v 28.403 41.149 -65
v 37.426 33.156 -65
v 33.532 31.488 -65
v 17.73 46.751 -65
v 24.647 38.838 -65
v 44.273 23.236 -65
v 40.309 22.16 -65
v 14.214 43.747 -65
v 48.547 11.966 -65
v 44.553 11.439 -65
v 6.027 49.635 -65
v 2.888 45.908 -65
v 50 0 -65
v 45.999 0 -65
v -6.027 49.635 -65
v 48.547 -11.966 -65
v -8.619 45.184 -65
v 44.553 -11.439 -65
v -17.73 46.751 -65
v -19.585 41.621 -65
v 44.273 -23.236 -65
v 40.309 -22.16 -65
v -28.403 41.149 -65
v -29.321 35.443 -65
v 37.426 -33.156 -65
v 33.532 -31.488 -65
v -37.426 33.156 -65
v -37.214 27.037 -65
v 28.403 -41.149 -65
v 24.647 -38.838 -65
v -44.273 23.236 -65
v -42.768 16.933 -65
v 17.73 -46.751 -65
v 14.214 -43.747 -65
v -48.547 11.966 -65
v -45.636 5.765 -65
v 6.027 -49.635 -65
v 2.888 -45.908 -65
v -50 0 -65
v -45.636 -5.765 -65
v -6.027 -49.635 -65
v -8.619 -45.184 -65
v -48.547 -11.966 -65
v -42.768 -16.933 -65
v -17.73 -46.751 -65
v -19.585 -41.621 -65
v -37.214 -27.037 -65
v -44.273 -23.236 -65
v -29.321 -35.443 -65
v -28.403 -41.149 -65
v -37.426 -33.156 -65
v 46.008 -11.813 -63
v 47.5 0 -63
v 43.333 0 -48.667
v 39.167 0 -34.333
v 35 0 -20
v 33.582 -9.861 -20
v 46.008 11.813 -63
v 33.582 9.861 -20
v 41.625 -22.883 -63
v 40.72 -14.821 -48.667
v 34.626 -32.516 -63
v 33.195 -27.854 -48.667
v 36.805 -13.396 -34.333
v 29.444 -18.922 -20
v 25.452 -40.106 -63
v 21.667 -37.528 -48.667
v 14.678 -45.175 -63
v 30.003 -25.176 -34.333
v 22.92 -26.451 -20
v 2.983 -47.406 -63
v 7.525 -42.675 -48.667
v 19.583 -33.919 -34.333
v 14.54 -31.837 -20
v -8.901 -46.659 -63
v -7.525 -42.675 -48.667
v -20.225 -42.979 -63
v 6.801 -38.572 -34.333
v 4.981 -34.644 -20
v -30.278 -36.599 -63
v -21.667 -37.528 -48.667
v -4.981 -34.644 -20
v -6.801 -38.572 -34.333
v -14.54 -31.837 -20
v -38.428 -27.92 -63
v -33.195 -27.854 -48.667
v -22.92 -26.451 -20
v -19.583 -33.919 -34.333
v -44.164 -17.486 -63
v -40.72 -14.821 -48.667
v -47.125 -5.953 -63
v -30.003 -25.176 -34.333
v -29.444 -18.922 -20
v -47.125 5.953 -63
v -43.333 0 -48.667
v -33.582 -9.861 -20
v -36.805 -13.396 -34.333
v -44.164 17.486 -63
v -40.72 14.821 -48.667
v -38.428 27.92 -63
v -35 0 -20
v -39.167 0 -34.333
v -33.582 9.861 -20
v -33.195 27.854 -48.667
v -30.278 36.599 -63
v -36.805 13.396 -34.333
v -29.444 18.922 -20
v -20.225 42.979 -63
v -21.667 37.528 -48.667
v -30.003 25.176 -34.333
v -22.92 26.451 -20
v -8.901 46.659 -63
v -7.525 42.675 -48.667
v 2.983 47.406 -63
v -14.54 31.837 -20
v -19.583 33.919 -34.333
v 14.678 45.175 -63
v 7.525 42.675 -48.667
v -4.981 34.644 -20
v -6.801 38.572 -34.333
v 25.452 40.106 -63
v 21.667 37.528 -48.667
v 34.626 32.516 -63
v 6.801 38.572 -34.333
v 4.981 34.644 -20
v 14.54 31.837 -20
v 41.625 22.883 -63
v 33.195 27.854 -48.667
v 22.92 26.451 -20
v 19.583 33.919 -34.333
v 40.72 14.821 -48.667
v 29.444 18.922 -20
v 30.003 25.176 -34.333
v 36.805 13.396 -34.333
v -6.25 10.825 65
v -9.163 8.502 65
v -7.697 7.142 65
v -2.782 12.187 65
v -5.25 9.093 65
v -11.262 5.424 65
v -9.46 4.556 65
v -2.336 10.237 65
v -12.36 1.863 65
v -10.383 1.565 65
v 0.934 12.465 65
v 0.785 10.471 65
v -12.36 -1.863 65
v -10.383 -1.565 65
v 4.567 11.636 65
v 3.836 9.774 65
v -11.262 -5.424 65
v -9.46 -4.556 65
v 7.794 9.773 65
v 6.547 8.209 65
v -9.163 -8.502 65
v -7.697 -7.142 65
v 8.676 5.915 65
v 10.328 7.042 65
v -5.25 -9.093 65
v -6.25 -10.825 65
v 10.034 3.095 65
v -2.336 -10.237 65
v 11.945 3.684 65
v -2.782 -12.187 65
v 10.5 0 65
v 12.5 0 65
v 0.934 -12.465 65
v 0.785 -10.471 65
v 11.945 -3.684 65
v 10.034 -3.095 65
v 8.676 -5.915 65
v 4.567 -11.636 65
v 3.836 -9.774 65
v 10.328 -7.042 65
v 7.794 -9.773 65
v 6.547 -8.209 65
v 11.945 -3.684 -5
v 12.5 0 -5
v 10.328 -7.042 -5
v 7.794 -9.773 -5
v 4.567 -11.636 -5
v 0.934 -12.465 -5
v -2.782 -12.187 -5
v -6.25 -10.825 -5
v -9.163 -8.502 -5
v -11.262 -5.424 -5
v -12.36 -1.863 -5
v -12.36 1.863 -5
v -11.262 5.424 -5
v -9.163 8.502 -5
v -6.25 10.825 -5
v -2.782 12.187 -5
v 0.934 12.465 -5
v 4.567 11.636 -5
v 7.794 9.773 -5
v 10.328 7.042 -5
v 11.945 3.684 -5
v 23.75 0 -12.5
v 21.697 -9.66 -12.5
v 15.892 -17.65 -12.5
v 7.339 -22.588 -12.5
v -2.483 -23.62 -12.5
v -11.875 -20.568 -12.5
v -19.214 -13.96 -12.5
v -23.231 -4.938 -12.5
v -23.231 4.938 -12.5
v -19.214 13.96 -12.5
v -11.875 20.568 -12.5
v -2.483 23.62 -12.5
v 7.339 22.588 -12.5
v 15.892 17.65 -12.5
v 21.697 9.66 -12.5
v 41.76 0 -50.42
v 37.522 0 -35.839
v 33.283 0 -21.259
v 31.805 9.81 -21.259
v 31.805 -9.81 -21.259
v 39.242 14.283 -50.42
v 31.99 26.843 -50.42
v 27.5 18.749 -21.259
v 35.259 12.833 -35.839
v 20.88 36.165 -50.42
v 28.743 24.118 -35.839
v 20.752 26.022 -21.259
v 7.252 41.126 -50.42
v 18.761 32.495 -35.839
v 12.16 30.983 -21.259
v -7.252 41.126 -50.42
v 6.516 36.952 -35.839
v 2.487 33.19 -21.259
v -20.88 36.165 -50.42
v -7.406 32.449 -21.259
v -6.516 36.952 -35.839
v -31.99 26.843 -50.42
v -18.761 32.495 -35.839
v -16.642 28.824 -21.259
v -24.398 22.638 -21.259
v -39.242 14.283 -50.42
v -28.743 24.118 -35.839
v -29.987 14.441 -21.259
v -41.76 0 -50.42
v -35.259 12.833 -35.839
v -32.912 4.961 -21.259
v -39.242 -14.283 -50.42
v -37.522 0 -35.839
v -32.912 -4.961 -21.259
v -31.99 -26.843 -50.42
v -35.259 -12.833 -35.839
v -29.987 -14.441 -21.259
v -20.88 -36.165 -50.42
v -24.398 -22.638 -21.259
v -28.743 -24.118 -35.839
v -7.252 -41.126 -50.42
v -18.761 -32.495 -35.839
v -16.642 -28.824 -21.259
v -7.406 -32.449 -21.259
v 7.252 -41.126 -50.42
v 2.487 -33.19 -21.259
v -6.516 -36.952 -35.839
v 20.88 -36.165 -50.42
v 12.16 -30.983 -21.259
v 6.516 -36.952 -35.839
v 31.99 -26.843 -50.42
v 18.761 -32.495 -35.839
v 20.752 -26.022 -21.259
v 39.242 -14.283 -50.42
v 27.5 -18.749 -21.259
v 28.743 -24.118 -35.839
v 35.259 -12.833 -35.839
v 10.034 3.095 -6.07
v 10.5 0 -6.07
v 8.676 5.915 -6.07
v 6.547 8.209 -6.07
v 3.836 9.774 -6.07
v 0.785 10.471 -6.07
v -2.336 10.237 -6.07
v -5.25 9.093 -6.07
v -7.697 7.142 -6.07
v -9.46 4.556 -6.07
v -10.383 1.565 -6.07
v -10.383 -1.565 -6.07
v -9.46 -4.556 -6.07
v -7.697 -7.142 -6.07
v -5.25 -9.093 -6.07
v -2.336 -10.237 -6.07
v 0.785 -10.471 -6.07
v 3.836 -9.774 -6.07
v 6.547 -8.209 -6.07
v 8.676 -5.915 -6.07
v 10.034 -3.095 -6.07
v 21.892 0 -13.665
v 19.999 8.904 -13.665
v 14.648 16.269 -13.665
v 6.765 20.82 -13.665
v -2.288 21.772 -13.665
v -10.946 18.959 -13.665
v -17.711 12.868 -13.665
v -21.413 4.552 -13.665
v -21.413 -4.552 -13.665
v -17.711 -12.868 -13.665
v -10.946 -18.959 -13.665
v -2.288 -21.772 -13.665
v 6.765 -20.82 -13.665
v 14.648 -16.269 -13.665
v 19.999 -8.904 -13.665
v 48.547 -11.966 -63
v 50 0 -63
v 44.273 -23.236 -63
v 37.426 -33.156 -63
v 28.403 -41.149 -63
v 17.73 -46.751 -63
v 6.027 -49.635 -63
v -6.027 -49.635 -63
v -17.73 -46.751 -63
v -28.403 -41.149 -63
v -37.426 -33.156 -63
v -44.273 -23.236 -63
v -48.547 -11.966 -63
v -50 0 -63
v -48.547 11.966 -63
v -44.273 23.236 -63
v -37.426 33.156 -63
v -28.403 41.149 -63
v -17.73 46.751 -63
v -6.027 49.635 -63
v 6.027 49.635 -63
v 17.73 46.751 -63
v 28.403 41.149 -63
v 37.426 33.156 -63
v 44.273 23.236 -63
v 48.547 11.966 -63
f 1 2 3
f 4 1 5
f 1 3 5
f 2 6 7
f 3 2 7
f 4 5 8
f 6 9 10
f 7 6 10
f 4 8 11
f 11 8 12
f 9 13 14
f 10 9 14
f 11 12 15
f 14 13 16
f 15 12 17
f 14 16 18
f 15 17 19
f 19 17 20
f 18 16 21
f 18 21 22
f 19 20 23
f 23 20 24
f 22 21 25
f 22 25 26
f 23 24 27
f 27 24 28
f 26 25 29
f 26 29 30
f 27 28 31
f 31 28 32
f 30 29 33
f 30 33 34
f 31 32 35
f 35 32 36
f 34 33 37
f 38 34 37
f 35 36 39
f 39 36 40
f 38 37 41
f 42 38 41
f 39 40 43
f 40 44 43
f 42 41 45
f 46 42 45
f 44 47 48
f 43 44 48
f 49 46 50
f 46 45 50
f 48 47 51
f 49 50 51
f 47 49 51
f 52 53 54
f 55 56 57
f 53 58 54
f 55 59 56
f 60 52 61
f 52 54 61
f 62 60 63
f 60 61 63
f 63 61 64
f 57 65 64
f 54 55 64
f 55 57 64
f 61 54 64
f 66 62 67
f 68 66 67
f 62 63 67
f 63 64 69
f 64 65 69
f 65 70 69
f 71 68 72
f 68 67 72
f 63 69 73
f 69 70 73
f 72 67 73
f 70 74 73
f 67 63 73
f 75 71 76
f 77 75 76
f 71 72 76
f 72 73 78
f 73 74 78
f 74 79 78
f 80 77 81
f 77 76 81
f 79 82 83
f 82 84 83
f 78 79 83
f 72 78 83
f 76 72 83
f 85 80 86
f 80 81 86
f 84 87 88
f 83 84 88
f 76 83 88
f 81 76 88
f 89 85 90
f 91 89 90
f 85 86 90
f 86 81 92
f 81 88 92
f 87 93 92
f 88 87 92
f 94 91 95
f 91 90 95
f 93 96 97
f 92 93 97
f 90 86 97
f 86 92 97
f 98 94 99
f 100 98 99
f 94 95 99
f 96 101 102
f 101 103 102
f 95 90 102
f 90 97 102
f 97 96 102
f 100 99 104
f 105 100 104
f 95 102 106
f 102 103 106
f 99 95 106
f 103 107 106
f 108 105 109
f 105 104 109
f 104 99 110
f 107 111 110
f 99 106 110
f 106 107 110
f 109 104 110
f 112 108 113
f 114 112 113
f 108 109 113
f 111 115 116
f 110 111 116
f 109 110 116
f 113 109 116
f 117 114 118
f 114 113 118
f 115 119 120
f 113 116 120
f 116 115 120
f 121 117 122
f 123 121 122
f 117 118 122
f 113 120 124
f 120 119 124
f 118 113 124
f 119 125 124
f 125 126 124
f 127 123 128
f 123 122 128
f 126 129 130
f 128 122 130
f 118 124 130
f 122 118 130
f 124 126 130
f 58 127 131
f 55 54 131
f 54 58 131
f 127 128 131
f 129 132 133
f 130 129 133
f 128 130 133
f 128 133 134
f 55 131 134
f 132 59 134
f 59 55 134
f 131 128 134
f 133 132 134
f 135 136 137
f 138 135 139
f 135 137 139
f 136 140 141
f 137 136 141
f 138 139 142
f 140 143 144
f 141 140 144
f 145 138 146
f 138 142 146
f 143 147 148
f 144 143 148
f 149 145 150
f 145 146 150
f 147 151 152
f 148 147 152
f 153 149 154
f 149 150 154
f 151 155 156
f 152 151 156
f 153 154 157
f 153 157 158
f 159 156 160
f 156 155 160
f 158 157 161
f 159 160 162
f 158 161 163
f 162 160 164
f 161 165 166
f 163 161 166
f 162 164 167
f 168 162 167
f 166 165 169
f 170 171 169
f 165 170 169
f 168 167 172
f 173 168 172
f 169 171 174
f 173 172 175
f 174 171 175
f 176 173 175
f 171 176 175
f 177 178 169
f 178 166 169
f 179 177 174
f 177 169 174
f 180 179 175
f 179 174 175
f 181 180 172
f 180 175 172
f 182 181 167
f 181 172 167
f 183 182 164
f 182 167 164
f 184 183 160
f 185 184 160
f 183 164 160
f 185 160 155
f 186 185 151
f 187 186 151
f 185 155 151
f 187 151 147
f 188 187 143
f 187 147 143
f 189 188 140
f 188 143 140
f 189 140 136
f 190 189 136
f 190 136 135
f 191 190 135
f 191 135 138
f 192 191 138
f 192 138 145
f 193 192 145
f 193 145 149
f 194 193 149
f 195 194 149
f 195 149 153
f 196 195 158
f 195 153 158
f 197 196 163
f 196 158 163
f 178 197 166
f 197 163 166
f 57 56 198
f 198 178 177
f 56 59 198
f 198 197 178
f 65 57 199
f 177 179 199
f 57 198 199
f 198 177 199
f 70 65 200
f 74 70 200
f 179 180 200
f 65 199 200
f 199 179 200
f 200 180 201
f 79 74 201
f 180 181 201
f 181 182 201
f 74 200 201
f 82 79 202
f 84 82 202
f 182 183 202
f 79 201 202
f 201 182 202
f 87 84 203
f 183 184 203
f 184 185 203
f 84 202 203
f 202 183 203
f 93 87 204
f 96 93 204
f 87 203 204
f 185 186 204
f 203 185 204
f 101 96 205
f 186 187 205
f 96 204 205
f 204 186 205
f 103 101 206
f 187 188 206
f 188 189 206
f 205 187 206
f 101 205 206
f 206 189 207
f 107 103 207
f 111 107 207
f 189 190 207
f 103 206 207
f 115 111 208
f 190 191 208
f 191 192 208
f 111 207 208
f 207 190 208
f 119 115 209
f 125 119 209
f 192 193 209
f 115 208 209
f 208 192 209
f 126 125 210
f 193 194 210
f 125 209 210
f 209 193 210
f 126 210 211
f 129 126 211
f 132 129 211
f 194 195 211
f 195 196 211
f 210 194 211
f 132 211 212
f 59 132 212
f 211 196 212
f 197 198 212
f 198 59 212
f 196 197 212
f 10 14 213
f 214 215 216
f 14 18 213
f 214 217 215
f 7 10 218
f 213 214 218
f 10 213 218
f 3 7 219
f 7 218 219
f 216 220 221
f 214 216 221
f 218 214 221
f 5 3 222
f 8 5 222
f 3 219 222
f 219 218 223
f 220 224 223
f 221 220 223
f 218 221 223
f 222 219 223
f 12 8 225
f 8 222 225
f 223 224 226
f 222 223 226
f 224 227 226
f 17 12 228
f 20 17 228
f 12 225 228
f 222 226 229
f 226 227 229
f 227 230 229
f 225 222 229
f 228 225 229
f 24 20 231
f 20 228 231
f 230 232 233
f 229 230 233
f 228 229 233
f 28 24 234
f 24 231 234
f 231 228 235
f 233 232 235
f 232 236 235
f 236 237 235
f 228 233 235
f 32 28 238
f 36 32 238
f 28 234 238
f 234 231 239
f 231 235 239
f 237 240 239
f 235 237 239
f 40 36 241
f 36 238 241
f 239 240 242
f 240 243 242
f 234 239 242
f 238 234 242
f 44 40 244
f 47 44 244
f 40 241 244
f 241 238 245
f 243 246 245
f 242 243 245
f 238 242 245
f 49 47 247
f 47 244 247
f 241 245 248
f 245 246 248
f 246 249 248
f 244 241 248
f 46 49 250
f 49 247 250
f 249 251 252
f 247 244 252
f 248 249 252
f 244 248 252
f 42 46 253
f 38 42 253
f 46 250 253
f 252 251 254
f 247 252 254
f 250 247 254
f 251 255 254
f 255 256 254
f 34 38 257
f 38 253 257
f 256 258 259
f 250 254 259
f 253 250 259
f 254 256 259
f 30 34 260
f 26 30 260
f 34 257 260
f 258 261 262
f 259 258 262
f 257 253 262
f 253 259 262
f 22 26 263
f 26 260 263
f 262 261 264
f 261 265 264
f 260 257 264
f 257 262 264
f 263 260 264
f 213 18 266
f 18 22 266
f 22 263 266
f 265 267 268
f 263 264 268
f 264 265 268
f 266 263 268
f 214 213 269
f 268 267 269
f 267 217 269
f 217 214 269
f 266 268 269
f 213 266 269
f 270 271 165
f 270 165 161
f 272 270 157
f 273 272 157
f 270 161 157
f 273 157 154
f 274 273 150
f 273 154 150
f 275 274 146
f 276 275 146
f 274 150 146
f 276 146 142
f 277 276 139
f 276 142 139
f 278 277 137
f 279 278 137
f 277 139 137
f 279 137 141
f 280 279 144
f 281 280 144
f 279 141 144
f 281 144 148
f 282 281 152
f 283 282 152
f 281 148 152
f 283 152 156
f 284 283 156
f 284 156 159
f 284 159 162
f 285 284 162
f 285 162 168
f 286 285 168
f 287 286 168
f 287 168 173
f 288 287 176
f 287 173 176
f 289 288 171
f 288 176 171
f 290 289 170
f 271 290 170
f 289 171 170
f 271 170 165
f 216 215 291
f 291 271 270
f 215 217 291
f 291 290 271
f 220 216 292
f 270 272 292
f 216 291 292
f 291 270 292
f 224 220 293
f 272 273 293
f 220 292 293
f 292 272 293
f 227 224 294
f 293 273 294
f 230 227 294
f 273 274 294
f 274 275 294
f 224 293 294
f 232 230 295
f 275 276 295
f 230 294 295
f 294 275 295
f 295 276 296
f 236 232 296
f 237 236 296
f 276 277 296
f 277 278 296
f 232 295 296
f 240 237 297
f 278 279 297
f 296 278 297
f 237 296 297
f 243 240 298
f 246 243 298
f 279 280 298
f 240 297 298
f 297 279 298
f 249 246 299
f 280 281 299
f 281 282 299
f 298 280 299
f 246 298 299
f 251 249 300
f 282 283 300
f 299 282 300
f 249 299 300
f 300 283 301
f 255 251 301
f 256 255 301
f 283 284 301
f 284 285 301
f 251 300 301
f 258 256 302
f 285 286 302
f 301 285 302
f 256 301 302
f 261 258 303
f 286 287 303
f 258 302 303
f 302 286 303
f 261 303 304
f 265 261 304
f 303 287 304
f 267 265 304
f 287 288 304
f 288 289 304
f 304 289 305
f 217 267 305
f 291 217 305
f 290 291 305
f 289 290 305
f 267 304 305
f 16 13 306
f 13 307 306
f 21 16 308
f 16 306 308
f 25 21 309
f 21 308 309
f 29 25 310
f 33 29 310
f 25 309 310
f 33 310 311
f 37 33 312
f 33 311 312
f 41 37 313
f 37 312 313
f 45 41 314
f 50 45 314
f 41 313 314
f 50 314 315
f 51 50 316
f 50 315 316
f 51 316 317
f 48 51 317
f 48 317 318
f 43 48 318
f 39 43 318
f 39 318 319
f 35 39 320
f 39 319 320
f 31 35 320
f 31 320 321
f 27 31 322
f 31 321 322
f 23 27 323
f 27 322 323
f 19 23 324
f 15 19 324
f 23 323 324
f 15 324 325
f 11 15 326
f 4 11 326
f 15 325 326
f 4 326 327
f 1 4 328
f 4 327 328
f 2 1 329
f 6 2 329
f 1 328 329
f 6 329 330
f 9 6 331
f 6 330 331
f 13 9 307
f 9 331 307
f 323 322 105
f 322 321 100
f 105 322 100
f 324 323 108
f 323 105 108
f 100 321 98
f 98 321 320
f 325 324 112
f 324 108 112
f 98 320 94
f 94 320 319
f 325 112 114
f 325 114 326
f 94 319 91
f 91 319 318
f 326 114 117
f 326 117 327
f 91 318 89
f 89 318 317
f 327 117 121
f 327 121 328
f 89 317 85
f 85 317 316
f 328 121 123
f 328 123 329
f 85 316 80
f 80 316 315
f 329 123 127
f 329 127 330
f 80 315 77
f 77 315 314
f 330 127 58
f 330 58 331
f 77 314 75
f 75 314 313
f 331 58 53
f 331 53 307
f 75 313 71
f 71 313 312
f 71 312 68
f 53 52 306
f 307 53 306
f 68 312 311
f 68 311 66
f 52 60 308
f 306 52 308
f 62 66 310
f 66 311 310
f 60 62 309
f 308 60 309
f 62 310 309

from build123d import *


# Read off the part's stored shape, not the designer's step: Vaciado1
with BuildPart() as part:
    # Croquis1 → Revolución1 (revolve)
    with BuildSketch(Plane(origin=(0, 0, 0), x_dir=(1, 0, 0), z_dir=(0, 1, 0))):
        Polygon((0, -65), (0, 65), (50, 65), (50, 63), (47.5, 63), (35, 20), (12.5, 5), (12.5, -65), align=None)
    revolve(axis=Axis((0, 0, 65), (0, 0, -1)))

    # Vaciado1 outline → Vaciado1 (revolve, cut)
    with BuildSketch(Plane.XZ):
        Polygon((45.99860382, -65), (33.283256487, -21.259205175), (10.5, -6.070367517), (10.5, 65), (0, 65), (0, -65), align=None)
    revolve(axis=Axis((0, 0, 0), (0, 0, 1)), mode=Mode.SUBTRACT)


solid = part.part
